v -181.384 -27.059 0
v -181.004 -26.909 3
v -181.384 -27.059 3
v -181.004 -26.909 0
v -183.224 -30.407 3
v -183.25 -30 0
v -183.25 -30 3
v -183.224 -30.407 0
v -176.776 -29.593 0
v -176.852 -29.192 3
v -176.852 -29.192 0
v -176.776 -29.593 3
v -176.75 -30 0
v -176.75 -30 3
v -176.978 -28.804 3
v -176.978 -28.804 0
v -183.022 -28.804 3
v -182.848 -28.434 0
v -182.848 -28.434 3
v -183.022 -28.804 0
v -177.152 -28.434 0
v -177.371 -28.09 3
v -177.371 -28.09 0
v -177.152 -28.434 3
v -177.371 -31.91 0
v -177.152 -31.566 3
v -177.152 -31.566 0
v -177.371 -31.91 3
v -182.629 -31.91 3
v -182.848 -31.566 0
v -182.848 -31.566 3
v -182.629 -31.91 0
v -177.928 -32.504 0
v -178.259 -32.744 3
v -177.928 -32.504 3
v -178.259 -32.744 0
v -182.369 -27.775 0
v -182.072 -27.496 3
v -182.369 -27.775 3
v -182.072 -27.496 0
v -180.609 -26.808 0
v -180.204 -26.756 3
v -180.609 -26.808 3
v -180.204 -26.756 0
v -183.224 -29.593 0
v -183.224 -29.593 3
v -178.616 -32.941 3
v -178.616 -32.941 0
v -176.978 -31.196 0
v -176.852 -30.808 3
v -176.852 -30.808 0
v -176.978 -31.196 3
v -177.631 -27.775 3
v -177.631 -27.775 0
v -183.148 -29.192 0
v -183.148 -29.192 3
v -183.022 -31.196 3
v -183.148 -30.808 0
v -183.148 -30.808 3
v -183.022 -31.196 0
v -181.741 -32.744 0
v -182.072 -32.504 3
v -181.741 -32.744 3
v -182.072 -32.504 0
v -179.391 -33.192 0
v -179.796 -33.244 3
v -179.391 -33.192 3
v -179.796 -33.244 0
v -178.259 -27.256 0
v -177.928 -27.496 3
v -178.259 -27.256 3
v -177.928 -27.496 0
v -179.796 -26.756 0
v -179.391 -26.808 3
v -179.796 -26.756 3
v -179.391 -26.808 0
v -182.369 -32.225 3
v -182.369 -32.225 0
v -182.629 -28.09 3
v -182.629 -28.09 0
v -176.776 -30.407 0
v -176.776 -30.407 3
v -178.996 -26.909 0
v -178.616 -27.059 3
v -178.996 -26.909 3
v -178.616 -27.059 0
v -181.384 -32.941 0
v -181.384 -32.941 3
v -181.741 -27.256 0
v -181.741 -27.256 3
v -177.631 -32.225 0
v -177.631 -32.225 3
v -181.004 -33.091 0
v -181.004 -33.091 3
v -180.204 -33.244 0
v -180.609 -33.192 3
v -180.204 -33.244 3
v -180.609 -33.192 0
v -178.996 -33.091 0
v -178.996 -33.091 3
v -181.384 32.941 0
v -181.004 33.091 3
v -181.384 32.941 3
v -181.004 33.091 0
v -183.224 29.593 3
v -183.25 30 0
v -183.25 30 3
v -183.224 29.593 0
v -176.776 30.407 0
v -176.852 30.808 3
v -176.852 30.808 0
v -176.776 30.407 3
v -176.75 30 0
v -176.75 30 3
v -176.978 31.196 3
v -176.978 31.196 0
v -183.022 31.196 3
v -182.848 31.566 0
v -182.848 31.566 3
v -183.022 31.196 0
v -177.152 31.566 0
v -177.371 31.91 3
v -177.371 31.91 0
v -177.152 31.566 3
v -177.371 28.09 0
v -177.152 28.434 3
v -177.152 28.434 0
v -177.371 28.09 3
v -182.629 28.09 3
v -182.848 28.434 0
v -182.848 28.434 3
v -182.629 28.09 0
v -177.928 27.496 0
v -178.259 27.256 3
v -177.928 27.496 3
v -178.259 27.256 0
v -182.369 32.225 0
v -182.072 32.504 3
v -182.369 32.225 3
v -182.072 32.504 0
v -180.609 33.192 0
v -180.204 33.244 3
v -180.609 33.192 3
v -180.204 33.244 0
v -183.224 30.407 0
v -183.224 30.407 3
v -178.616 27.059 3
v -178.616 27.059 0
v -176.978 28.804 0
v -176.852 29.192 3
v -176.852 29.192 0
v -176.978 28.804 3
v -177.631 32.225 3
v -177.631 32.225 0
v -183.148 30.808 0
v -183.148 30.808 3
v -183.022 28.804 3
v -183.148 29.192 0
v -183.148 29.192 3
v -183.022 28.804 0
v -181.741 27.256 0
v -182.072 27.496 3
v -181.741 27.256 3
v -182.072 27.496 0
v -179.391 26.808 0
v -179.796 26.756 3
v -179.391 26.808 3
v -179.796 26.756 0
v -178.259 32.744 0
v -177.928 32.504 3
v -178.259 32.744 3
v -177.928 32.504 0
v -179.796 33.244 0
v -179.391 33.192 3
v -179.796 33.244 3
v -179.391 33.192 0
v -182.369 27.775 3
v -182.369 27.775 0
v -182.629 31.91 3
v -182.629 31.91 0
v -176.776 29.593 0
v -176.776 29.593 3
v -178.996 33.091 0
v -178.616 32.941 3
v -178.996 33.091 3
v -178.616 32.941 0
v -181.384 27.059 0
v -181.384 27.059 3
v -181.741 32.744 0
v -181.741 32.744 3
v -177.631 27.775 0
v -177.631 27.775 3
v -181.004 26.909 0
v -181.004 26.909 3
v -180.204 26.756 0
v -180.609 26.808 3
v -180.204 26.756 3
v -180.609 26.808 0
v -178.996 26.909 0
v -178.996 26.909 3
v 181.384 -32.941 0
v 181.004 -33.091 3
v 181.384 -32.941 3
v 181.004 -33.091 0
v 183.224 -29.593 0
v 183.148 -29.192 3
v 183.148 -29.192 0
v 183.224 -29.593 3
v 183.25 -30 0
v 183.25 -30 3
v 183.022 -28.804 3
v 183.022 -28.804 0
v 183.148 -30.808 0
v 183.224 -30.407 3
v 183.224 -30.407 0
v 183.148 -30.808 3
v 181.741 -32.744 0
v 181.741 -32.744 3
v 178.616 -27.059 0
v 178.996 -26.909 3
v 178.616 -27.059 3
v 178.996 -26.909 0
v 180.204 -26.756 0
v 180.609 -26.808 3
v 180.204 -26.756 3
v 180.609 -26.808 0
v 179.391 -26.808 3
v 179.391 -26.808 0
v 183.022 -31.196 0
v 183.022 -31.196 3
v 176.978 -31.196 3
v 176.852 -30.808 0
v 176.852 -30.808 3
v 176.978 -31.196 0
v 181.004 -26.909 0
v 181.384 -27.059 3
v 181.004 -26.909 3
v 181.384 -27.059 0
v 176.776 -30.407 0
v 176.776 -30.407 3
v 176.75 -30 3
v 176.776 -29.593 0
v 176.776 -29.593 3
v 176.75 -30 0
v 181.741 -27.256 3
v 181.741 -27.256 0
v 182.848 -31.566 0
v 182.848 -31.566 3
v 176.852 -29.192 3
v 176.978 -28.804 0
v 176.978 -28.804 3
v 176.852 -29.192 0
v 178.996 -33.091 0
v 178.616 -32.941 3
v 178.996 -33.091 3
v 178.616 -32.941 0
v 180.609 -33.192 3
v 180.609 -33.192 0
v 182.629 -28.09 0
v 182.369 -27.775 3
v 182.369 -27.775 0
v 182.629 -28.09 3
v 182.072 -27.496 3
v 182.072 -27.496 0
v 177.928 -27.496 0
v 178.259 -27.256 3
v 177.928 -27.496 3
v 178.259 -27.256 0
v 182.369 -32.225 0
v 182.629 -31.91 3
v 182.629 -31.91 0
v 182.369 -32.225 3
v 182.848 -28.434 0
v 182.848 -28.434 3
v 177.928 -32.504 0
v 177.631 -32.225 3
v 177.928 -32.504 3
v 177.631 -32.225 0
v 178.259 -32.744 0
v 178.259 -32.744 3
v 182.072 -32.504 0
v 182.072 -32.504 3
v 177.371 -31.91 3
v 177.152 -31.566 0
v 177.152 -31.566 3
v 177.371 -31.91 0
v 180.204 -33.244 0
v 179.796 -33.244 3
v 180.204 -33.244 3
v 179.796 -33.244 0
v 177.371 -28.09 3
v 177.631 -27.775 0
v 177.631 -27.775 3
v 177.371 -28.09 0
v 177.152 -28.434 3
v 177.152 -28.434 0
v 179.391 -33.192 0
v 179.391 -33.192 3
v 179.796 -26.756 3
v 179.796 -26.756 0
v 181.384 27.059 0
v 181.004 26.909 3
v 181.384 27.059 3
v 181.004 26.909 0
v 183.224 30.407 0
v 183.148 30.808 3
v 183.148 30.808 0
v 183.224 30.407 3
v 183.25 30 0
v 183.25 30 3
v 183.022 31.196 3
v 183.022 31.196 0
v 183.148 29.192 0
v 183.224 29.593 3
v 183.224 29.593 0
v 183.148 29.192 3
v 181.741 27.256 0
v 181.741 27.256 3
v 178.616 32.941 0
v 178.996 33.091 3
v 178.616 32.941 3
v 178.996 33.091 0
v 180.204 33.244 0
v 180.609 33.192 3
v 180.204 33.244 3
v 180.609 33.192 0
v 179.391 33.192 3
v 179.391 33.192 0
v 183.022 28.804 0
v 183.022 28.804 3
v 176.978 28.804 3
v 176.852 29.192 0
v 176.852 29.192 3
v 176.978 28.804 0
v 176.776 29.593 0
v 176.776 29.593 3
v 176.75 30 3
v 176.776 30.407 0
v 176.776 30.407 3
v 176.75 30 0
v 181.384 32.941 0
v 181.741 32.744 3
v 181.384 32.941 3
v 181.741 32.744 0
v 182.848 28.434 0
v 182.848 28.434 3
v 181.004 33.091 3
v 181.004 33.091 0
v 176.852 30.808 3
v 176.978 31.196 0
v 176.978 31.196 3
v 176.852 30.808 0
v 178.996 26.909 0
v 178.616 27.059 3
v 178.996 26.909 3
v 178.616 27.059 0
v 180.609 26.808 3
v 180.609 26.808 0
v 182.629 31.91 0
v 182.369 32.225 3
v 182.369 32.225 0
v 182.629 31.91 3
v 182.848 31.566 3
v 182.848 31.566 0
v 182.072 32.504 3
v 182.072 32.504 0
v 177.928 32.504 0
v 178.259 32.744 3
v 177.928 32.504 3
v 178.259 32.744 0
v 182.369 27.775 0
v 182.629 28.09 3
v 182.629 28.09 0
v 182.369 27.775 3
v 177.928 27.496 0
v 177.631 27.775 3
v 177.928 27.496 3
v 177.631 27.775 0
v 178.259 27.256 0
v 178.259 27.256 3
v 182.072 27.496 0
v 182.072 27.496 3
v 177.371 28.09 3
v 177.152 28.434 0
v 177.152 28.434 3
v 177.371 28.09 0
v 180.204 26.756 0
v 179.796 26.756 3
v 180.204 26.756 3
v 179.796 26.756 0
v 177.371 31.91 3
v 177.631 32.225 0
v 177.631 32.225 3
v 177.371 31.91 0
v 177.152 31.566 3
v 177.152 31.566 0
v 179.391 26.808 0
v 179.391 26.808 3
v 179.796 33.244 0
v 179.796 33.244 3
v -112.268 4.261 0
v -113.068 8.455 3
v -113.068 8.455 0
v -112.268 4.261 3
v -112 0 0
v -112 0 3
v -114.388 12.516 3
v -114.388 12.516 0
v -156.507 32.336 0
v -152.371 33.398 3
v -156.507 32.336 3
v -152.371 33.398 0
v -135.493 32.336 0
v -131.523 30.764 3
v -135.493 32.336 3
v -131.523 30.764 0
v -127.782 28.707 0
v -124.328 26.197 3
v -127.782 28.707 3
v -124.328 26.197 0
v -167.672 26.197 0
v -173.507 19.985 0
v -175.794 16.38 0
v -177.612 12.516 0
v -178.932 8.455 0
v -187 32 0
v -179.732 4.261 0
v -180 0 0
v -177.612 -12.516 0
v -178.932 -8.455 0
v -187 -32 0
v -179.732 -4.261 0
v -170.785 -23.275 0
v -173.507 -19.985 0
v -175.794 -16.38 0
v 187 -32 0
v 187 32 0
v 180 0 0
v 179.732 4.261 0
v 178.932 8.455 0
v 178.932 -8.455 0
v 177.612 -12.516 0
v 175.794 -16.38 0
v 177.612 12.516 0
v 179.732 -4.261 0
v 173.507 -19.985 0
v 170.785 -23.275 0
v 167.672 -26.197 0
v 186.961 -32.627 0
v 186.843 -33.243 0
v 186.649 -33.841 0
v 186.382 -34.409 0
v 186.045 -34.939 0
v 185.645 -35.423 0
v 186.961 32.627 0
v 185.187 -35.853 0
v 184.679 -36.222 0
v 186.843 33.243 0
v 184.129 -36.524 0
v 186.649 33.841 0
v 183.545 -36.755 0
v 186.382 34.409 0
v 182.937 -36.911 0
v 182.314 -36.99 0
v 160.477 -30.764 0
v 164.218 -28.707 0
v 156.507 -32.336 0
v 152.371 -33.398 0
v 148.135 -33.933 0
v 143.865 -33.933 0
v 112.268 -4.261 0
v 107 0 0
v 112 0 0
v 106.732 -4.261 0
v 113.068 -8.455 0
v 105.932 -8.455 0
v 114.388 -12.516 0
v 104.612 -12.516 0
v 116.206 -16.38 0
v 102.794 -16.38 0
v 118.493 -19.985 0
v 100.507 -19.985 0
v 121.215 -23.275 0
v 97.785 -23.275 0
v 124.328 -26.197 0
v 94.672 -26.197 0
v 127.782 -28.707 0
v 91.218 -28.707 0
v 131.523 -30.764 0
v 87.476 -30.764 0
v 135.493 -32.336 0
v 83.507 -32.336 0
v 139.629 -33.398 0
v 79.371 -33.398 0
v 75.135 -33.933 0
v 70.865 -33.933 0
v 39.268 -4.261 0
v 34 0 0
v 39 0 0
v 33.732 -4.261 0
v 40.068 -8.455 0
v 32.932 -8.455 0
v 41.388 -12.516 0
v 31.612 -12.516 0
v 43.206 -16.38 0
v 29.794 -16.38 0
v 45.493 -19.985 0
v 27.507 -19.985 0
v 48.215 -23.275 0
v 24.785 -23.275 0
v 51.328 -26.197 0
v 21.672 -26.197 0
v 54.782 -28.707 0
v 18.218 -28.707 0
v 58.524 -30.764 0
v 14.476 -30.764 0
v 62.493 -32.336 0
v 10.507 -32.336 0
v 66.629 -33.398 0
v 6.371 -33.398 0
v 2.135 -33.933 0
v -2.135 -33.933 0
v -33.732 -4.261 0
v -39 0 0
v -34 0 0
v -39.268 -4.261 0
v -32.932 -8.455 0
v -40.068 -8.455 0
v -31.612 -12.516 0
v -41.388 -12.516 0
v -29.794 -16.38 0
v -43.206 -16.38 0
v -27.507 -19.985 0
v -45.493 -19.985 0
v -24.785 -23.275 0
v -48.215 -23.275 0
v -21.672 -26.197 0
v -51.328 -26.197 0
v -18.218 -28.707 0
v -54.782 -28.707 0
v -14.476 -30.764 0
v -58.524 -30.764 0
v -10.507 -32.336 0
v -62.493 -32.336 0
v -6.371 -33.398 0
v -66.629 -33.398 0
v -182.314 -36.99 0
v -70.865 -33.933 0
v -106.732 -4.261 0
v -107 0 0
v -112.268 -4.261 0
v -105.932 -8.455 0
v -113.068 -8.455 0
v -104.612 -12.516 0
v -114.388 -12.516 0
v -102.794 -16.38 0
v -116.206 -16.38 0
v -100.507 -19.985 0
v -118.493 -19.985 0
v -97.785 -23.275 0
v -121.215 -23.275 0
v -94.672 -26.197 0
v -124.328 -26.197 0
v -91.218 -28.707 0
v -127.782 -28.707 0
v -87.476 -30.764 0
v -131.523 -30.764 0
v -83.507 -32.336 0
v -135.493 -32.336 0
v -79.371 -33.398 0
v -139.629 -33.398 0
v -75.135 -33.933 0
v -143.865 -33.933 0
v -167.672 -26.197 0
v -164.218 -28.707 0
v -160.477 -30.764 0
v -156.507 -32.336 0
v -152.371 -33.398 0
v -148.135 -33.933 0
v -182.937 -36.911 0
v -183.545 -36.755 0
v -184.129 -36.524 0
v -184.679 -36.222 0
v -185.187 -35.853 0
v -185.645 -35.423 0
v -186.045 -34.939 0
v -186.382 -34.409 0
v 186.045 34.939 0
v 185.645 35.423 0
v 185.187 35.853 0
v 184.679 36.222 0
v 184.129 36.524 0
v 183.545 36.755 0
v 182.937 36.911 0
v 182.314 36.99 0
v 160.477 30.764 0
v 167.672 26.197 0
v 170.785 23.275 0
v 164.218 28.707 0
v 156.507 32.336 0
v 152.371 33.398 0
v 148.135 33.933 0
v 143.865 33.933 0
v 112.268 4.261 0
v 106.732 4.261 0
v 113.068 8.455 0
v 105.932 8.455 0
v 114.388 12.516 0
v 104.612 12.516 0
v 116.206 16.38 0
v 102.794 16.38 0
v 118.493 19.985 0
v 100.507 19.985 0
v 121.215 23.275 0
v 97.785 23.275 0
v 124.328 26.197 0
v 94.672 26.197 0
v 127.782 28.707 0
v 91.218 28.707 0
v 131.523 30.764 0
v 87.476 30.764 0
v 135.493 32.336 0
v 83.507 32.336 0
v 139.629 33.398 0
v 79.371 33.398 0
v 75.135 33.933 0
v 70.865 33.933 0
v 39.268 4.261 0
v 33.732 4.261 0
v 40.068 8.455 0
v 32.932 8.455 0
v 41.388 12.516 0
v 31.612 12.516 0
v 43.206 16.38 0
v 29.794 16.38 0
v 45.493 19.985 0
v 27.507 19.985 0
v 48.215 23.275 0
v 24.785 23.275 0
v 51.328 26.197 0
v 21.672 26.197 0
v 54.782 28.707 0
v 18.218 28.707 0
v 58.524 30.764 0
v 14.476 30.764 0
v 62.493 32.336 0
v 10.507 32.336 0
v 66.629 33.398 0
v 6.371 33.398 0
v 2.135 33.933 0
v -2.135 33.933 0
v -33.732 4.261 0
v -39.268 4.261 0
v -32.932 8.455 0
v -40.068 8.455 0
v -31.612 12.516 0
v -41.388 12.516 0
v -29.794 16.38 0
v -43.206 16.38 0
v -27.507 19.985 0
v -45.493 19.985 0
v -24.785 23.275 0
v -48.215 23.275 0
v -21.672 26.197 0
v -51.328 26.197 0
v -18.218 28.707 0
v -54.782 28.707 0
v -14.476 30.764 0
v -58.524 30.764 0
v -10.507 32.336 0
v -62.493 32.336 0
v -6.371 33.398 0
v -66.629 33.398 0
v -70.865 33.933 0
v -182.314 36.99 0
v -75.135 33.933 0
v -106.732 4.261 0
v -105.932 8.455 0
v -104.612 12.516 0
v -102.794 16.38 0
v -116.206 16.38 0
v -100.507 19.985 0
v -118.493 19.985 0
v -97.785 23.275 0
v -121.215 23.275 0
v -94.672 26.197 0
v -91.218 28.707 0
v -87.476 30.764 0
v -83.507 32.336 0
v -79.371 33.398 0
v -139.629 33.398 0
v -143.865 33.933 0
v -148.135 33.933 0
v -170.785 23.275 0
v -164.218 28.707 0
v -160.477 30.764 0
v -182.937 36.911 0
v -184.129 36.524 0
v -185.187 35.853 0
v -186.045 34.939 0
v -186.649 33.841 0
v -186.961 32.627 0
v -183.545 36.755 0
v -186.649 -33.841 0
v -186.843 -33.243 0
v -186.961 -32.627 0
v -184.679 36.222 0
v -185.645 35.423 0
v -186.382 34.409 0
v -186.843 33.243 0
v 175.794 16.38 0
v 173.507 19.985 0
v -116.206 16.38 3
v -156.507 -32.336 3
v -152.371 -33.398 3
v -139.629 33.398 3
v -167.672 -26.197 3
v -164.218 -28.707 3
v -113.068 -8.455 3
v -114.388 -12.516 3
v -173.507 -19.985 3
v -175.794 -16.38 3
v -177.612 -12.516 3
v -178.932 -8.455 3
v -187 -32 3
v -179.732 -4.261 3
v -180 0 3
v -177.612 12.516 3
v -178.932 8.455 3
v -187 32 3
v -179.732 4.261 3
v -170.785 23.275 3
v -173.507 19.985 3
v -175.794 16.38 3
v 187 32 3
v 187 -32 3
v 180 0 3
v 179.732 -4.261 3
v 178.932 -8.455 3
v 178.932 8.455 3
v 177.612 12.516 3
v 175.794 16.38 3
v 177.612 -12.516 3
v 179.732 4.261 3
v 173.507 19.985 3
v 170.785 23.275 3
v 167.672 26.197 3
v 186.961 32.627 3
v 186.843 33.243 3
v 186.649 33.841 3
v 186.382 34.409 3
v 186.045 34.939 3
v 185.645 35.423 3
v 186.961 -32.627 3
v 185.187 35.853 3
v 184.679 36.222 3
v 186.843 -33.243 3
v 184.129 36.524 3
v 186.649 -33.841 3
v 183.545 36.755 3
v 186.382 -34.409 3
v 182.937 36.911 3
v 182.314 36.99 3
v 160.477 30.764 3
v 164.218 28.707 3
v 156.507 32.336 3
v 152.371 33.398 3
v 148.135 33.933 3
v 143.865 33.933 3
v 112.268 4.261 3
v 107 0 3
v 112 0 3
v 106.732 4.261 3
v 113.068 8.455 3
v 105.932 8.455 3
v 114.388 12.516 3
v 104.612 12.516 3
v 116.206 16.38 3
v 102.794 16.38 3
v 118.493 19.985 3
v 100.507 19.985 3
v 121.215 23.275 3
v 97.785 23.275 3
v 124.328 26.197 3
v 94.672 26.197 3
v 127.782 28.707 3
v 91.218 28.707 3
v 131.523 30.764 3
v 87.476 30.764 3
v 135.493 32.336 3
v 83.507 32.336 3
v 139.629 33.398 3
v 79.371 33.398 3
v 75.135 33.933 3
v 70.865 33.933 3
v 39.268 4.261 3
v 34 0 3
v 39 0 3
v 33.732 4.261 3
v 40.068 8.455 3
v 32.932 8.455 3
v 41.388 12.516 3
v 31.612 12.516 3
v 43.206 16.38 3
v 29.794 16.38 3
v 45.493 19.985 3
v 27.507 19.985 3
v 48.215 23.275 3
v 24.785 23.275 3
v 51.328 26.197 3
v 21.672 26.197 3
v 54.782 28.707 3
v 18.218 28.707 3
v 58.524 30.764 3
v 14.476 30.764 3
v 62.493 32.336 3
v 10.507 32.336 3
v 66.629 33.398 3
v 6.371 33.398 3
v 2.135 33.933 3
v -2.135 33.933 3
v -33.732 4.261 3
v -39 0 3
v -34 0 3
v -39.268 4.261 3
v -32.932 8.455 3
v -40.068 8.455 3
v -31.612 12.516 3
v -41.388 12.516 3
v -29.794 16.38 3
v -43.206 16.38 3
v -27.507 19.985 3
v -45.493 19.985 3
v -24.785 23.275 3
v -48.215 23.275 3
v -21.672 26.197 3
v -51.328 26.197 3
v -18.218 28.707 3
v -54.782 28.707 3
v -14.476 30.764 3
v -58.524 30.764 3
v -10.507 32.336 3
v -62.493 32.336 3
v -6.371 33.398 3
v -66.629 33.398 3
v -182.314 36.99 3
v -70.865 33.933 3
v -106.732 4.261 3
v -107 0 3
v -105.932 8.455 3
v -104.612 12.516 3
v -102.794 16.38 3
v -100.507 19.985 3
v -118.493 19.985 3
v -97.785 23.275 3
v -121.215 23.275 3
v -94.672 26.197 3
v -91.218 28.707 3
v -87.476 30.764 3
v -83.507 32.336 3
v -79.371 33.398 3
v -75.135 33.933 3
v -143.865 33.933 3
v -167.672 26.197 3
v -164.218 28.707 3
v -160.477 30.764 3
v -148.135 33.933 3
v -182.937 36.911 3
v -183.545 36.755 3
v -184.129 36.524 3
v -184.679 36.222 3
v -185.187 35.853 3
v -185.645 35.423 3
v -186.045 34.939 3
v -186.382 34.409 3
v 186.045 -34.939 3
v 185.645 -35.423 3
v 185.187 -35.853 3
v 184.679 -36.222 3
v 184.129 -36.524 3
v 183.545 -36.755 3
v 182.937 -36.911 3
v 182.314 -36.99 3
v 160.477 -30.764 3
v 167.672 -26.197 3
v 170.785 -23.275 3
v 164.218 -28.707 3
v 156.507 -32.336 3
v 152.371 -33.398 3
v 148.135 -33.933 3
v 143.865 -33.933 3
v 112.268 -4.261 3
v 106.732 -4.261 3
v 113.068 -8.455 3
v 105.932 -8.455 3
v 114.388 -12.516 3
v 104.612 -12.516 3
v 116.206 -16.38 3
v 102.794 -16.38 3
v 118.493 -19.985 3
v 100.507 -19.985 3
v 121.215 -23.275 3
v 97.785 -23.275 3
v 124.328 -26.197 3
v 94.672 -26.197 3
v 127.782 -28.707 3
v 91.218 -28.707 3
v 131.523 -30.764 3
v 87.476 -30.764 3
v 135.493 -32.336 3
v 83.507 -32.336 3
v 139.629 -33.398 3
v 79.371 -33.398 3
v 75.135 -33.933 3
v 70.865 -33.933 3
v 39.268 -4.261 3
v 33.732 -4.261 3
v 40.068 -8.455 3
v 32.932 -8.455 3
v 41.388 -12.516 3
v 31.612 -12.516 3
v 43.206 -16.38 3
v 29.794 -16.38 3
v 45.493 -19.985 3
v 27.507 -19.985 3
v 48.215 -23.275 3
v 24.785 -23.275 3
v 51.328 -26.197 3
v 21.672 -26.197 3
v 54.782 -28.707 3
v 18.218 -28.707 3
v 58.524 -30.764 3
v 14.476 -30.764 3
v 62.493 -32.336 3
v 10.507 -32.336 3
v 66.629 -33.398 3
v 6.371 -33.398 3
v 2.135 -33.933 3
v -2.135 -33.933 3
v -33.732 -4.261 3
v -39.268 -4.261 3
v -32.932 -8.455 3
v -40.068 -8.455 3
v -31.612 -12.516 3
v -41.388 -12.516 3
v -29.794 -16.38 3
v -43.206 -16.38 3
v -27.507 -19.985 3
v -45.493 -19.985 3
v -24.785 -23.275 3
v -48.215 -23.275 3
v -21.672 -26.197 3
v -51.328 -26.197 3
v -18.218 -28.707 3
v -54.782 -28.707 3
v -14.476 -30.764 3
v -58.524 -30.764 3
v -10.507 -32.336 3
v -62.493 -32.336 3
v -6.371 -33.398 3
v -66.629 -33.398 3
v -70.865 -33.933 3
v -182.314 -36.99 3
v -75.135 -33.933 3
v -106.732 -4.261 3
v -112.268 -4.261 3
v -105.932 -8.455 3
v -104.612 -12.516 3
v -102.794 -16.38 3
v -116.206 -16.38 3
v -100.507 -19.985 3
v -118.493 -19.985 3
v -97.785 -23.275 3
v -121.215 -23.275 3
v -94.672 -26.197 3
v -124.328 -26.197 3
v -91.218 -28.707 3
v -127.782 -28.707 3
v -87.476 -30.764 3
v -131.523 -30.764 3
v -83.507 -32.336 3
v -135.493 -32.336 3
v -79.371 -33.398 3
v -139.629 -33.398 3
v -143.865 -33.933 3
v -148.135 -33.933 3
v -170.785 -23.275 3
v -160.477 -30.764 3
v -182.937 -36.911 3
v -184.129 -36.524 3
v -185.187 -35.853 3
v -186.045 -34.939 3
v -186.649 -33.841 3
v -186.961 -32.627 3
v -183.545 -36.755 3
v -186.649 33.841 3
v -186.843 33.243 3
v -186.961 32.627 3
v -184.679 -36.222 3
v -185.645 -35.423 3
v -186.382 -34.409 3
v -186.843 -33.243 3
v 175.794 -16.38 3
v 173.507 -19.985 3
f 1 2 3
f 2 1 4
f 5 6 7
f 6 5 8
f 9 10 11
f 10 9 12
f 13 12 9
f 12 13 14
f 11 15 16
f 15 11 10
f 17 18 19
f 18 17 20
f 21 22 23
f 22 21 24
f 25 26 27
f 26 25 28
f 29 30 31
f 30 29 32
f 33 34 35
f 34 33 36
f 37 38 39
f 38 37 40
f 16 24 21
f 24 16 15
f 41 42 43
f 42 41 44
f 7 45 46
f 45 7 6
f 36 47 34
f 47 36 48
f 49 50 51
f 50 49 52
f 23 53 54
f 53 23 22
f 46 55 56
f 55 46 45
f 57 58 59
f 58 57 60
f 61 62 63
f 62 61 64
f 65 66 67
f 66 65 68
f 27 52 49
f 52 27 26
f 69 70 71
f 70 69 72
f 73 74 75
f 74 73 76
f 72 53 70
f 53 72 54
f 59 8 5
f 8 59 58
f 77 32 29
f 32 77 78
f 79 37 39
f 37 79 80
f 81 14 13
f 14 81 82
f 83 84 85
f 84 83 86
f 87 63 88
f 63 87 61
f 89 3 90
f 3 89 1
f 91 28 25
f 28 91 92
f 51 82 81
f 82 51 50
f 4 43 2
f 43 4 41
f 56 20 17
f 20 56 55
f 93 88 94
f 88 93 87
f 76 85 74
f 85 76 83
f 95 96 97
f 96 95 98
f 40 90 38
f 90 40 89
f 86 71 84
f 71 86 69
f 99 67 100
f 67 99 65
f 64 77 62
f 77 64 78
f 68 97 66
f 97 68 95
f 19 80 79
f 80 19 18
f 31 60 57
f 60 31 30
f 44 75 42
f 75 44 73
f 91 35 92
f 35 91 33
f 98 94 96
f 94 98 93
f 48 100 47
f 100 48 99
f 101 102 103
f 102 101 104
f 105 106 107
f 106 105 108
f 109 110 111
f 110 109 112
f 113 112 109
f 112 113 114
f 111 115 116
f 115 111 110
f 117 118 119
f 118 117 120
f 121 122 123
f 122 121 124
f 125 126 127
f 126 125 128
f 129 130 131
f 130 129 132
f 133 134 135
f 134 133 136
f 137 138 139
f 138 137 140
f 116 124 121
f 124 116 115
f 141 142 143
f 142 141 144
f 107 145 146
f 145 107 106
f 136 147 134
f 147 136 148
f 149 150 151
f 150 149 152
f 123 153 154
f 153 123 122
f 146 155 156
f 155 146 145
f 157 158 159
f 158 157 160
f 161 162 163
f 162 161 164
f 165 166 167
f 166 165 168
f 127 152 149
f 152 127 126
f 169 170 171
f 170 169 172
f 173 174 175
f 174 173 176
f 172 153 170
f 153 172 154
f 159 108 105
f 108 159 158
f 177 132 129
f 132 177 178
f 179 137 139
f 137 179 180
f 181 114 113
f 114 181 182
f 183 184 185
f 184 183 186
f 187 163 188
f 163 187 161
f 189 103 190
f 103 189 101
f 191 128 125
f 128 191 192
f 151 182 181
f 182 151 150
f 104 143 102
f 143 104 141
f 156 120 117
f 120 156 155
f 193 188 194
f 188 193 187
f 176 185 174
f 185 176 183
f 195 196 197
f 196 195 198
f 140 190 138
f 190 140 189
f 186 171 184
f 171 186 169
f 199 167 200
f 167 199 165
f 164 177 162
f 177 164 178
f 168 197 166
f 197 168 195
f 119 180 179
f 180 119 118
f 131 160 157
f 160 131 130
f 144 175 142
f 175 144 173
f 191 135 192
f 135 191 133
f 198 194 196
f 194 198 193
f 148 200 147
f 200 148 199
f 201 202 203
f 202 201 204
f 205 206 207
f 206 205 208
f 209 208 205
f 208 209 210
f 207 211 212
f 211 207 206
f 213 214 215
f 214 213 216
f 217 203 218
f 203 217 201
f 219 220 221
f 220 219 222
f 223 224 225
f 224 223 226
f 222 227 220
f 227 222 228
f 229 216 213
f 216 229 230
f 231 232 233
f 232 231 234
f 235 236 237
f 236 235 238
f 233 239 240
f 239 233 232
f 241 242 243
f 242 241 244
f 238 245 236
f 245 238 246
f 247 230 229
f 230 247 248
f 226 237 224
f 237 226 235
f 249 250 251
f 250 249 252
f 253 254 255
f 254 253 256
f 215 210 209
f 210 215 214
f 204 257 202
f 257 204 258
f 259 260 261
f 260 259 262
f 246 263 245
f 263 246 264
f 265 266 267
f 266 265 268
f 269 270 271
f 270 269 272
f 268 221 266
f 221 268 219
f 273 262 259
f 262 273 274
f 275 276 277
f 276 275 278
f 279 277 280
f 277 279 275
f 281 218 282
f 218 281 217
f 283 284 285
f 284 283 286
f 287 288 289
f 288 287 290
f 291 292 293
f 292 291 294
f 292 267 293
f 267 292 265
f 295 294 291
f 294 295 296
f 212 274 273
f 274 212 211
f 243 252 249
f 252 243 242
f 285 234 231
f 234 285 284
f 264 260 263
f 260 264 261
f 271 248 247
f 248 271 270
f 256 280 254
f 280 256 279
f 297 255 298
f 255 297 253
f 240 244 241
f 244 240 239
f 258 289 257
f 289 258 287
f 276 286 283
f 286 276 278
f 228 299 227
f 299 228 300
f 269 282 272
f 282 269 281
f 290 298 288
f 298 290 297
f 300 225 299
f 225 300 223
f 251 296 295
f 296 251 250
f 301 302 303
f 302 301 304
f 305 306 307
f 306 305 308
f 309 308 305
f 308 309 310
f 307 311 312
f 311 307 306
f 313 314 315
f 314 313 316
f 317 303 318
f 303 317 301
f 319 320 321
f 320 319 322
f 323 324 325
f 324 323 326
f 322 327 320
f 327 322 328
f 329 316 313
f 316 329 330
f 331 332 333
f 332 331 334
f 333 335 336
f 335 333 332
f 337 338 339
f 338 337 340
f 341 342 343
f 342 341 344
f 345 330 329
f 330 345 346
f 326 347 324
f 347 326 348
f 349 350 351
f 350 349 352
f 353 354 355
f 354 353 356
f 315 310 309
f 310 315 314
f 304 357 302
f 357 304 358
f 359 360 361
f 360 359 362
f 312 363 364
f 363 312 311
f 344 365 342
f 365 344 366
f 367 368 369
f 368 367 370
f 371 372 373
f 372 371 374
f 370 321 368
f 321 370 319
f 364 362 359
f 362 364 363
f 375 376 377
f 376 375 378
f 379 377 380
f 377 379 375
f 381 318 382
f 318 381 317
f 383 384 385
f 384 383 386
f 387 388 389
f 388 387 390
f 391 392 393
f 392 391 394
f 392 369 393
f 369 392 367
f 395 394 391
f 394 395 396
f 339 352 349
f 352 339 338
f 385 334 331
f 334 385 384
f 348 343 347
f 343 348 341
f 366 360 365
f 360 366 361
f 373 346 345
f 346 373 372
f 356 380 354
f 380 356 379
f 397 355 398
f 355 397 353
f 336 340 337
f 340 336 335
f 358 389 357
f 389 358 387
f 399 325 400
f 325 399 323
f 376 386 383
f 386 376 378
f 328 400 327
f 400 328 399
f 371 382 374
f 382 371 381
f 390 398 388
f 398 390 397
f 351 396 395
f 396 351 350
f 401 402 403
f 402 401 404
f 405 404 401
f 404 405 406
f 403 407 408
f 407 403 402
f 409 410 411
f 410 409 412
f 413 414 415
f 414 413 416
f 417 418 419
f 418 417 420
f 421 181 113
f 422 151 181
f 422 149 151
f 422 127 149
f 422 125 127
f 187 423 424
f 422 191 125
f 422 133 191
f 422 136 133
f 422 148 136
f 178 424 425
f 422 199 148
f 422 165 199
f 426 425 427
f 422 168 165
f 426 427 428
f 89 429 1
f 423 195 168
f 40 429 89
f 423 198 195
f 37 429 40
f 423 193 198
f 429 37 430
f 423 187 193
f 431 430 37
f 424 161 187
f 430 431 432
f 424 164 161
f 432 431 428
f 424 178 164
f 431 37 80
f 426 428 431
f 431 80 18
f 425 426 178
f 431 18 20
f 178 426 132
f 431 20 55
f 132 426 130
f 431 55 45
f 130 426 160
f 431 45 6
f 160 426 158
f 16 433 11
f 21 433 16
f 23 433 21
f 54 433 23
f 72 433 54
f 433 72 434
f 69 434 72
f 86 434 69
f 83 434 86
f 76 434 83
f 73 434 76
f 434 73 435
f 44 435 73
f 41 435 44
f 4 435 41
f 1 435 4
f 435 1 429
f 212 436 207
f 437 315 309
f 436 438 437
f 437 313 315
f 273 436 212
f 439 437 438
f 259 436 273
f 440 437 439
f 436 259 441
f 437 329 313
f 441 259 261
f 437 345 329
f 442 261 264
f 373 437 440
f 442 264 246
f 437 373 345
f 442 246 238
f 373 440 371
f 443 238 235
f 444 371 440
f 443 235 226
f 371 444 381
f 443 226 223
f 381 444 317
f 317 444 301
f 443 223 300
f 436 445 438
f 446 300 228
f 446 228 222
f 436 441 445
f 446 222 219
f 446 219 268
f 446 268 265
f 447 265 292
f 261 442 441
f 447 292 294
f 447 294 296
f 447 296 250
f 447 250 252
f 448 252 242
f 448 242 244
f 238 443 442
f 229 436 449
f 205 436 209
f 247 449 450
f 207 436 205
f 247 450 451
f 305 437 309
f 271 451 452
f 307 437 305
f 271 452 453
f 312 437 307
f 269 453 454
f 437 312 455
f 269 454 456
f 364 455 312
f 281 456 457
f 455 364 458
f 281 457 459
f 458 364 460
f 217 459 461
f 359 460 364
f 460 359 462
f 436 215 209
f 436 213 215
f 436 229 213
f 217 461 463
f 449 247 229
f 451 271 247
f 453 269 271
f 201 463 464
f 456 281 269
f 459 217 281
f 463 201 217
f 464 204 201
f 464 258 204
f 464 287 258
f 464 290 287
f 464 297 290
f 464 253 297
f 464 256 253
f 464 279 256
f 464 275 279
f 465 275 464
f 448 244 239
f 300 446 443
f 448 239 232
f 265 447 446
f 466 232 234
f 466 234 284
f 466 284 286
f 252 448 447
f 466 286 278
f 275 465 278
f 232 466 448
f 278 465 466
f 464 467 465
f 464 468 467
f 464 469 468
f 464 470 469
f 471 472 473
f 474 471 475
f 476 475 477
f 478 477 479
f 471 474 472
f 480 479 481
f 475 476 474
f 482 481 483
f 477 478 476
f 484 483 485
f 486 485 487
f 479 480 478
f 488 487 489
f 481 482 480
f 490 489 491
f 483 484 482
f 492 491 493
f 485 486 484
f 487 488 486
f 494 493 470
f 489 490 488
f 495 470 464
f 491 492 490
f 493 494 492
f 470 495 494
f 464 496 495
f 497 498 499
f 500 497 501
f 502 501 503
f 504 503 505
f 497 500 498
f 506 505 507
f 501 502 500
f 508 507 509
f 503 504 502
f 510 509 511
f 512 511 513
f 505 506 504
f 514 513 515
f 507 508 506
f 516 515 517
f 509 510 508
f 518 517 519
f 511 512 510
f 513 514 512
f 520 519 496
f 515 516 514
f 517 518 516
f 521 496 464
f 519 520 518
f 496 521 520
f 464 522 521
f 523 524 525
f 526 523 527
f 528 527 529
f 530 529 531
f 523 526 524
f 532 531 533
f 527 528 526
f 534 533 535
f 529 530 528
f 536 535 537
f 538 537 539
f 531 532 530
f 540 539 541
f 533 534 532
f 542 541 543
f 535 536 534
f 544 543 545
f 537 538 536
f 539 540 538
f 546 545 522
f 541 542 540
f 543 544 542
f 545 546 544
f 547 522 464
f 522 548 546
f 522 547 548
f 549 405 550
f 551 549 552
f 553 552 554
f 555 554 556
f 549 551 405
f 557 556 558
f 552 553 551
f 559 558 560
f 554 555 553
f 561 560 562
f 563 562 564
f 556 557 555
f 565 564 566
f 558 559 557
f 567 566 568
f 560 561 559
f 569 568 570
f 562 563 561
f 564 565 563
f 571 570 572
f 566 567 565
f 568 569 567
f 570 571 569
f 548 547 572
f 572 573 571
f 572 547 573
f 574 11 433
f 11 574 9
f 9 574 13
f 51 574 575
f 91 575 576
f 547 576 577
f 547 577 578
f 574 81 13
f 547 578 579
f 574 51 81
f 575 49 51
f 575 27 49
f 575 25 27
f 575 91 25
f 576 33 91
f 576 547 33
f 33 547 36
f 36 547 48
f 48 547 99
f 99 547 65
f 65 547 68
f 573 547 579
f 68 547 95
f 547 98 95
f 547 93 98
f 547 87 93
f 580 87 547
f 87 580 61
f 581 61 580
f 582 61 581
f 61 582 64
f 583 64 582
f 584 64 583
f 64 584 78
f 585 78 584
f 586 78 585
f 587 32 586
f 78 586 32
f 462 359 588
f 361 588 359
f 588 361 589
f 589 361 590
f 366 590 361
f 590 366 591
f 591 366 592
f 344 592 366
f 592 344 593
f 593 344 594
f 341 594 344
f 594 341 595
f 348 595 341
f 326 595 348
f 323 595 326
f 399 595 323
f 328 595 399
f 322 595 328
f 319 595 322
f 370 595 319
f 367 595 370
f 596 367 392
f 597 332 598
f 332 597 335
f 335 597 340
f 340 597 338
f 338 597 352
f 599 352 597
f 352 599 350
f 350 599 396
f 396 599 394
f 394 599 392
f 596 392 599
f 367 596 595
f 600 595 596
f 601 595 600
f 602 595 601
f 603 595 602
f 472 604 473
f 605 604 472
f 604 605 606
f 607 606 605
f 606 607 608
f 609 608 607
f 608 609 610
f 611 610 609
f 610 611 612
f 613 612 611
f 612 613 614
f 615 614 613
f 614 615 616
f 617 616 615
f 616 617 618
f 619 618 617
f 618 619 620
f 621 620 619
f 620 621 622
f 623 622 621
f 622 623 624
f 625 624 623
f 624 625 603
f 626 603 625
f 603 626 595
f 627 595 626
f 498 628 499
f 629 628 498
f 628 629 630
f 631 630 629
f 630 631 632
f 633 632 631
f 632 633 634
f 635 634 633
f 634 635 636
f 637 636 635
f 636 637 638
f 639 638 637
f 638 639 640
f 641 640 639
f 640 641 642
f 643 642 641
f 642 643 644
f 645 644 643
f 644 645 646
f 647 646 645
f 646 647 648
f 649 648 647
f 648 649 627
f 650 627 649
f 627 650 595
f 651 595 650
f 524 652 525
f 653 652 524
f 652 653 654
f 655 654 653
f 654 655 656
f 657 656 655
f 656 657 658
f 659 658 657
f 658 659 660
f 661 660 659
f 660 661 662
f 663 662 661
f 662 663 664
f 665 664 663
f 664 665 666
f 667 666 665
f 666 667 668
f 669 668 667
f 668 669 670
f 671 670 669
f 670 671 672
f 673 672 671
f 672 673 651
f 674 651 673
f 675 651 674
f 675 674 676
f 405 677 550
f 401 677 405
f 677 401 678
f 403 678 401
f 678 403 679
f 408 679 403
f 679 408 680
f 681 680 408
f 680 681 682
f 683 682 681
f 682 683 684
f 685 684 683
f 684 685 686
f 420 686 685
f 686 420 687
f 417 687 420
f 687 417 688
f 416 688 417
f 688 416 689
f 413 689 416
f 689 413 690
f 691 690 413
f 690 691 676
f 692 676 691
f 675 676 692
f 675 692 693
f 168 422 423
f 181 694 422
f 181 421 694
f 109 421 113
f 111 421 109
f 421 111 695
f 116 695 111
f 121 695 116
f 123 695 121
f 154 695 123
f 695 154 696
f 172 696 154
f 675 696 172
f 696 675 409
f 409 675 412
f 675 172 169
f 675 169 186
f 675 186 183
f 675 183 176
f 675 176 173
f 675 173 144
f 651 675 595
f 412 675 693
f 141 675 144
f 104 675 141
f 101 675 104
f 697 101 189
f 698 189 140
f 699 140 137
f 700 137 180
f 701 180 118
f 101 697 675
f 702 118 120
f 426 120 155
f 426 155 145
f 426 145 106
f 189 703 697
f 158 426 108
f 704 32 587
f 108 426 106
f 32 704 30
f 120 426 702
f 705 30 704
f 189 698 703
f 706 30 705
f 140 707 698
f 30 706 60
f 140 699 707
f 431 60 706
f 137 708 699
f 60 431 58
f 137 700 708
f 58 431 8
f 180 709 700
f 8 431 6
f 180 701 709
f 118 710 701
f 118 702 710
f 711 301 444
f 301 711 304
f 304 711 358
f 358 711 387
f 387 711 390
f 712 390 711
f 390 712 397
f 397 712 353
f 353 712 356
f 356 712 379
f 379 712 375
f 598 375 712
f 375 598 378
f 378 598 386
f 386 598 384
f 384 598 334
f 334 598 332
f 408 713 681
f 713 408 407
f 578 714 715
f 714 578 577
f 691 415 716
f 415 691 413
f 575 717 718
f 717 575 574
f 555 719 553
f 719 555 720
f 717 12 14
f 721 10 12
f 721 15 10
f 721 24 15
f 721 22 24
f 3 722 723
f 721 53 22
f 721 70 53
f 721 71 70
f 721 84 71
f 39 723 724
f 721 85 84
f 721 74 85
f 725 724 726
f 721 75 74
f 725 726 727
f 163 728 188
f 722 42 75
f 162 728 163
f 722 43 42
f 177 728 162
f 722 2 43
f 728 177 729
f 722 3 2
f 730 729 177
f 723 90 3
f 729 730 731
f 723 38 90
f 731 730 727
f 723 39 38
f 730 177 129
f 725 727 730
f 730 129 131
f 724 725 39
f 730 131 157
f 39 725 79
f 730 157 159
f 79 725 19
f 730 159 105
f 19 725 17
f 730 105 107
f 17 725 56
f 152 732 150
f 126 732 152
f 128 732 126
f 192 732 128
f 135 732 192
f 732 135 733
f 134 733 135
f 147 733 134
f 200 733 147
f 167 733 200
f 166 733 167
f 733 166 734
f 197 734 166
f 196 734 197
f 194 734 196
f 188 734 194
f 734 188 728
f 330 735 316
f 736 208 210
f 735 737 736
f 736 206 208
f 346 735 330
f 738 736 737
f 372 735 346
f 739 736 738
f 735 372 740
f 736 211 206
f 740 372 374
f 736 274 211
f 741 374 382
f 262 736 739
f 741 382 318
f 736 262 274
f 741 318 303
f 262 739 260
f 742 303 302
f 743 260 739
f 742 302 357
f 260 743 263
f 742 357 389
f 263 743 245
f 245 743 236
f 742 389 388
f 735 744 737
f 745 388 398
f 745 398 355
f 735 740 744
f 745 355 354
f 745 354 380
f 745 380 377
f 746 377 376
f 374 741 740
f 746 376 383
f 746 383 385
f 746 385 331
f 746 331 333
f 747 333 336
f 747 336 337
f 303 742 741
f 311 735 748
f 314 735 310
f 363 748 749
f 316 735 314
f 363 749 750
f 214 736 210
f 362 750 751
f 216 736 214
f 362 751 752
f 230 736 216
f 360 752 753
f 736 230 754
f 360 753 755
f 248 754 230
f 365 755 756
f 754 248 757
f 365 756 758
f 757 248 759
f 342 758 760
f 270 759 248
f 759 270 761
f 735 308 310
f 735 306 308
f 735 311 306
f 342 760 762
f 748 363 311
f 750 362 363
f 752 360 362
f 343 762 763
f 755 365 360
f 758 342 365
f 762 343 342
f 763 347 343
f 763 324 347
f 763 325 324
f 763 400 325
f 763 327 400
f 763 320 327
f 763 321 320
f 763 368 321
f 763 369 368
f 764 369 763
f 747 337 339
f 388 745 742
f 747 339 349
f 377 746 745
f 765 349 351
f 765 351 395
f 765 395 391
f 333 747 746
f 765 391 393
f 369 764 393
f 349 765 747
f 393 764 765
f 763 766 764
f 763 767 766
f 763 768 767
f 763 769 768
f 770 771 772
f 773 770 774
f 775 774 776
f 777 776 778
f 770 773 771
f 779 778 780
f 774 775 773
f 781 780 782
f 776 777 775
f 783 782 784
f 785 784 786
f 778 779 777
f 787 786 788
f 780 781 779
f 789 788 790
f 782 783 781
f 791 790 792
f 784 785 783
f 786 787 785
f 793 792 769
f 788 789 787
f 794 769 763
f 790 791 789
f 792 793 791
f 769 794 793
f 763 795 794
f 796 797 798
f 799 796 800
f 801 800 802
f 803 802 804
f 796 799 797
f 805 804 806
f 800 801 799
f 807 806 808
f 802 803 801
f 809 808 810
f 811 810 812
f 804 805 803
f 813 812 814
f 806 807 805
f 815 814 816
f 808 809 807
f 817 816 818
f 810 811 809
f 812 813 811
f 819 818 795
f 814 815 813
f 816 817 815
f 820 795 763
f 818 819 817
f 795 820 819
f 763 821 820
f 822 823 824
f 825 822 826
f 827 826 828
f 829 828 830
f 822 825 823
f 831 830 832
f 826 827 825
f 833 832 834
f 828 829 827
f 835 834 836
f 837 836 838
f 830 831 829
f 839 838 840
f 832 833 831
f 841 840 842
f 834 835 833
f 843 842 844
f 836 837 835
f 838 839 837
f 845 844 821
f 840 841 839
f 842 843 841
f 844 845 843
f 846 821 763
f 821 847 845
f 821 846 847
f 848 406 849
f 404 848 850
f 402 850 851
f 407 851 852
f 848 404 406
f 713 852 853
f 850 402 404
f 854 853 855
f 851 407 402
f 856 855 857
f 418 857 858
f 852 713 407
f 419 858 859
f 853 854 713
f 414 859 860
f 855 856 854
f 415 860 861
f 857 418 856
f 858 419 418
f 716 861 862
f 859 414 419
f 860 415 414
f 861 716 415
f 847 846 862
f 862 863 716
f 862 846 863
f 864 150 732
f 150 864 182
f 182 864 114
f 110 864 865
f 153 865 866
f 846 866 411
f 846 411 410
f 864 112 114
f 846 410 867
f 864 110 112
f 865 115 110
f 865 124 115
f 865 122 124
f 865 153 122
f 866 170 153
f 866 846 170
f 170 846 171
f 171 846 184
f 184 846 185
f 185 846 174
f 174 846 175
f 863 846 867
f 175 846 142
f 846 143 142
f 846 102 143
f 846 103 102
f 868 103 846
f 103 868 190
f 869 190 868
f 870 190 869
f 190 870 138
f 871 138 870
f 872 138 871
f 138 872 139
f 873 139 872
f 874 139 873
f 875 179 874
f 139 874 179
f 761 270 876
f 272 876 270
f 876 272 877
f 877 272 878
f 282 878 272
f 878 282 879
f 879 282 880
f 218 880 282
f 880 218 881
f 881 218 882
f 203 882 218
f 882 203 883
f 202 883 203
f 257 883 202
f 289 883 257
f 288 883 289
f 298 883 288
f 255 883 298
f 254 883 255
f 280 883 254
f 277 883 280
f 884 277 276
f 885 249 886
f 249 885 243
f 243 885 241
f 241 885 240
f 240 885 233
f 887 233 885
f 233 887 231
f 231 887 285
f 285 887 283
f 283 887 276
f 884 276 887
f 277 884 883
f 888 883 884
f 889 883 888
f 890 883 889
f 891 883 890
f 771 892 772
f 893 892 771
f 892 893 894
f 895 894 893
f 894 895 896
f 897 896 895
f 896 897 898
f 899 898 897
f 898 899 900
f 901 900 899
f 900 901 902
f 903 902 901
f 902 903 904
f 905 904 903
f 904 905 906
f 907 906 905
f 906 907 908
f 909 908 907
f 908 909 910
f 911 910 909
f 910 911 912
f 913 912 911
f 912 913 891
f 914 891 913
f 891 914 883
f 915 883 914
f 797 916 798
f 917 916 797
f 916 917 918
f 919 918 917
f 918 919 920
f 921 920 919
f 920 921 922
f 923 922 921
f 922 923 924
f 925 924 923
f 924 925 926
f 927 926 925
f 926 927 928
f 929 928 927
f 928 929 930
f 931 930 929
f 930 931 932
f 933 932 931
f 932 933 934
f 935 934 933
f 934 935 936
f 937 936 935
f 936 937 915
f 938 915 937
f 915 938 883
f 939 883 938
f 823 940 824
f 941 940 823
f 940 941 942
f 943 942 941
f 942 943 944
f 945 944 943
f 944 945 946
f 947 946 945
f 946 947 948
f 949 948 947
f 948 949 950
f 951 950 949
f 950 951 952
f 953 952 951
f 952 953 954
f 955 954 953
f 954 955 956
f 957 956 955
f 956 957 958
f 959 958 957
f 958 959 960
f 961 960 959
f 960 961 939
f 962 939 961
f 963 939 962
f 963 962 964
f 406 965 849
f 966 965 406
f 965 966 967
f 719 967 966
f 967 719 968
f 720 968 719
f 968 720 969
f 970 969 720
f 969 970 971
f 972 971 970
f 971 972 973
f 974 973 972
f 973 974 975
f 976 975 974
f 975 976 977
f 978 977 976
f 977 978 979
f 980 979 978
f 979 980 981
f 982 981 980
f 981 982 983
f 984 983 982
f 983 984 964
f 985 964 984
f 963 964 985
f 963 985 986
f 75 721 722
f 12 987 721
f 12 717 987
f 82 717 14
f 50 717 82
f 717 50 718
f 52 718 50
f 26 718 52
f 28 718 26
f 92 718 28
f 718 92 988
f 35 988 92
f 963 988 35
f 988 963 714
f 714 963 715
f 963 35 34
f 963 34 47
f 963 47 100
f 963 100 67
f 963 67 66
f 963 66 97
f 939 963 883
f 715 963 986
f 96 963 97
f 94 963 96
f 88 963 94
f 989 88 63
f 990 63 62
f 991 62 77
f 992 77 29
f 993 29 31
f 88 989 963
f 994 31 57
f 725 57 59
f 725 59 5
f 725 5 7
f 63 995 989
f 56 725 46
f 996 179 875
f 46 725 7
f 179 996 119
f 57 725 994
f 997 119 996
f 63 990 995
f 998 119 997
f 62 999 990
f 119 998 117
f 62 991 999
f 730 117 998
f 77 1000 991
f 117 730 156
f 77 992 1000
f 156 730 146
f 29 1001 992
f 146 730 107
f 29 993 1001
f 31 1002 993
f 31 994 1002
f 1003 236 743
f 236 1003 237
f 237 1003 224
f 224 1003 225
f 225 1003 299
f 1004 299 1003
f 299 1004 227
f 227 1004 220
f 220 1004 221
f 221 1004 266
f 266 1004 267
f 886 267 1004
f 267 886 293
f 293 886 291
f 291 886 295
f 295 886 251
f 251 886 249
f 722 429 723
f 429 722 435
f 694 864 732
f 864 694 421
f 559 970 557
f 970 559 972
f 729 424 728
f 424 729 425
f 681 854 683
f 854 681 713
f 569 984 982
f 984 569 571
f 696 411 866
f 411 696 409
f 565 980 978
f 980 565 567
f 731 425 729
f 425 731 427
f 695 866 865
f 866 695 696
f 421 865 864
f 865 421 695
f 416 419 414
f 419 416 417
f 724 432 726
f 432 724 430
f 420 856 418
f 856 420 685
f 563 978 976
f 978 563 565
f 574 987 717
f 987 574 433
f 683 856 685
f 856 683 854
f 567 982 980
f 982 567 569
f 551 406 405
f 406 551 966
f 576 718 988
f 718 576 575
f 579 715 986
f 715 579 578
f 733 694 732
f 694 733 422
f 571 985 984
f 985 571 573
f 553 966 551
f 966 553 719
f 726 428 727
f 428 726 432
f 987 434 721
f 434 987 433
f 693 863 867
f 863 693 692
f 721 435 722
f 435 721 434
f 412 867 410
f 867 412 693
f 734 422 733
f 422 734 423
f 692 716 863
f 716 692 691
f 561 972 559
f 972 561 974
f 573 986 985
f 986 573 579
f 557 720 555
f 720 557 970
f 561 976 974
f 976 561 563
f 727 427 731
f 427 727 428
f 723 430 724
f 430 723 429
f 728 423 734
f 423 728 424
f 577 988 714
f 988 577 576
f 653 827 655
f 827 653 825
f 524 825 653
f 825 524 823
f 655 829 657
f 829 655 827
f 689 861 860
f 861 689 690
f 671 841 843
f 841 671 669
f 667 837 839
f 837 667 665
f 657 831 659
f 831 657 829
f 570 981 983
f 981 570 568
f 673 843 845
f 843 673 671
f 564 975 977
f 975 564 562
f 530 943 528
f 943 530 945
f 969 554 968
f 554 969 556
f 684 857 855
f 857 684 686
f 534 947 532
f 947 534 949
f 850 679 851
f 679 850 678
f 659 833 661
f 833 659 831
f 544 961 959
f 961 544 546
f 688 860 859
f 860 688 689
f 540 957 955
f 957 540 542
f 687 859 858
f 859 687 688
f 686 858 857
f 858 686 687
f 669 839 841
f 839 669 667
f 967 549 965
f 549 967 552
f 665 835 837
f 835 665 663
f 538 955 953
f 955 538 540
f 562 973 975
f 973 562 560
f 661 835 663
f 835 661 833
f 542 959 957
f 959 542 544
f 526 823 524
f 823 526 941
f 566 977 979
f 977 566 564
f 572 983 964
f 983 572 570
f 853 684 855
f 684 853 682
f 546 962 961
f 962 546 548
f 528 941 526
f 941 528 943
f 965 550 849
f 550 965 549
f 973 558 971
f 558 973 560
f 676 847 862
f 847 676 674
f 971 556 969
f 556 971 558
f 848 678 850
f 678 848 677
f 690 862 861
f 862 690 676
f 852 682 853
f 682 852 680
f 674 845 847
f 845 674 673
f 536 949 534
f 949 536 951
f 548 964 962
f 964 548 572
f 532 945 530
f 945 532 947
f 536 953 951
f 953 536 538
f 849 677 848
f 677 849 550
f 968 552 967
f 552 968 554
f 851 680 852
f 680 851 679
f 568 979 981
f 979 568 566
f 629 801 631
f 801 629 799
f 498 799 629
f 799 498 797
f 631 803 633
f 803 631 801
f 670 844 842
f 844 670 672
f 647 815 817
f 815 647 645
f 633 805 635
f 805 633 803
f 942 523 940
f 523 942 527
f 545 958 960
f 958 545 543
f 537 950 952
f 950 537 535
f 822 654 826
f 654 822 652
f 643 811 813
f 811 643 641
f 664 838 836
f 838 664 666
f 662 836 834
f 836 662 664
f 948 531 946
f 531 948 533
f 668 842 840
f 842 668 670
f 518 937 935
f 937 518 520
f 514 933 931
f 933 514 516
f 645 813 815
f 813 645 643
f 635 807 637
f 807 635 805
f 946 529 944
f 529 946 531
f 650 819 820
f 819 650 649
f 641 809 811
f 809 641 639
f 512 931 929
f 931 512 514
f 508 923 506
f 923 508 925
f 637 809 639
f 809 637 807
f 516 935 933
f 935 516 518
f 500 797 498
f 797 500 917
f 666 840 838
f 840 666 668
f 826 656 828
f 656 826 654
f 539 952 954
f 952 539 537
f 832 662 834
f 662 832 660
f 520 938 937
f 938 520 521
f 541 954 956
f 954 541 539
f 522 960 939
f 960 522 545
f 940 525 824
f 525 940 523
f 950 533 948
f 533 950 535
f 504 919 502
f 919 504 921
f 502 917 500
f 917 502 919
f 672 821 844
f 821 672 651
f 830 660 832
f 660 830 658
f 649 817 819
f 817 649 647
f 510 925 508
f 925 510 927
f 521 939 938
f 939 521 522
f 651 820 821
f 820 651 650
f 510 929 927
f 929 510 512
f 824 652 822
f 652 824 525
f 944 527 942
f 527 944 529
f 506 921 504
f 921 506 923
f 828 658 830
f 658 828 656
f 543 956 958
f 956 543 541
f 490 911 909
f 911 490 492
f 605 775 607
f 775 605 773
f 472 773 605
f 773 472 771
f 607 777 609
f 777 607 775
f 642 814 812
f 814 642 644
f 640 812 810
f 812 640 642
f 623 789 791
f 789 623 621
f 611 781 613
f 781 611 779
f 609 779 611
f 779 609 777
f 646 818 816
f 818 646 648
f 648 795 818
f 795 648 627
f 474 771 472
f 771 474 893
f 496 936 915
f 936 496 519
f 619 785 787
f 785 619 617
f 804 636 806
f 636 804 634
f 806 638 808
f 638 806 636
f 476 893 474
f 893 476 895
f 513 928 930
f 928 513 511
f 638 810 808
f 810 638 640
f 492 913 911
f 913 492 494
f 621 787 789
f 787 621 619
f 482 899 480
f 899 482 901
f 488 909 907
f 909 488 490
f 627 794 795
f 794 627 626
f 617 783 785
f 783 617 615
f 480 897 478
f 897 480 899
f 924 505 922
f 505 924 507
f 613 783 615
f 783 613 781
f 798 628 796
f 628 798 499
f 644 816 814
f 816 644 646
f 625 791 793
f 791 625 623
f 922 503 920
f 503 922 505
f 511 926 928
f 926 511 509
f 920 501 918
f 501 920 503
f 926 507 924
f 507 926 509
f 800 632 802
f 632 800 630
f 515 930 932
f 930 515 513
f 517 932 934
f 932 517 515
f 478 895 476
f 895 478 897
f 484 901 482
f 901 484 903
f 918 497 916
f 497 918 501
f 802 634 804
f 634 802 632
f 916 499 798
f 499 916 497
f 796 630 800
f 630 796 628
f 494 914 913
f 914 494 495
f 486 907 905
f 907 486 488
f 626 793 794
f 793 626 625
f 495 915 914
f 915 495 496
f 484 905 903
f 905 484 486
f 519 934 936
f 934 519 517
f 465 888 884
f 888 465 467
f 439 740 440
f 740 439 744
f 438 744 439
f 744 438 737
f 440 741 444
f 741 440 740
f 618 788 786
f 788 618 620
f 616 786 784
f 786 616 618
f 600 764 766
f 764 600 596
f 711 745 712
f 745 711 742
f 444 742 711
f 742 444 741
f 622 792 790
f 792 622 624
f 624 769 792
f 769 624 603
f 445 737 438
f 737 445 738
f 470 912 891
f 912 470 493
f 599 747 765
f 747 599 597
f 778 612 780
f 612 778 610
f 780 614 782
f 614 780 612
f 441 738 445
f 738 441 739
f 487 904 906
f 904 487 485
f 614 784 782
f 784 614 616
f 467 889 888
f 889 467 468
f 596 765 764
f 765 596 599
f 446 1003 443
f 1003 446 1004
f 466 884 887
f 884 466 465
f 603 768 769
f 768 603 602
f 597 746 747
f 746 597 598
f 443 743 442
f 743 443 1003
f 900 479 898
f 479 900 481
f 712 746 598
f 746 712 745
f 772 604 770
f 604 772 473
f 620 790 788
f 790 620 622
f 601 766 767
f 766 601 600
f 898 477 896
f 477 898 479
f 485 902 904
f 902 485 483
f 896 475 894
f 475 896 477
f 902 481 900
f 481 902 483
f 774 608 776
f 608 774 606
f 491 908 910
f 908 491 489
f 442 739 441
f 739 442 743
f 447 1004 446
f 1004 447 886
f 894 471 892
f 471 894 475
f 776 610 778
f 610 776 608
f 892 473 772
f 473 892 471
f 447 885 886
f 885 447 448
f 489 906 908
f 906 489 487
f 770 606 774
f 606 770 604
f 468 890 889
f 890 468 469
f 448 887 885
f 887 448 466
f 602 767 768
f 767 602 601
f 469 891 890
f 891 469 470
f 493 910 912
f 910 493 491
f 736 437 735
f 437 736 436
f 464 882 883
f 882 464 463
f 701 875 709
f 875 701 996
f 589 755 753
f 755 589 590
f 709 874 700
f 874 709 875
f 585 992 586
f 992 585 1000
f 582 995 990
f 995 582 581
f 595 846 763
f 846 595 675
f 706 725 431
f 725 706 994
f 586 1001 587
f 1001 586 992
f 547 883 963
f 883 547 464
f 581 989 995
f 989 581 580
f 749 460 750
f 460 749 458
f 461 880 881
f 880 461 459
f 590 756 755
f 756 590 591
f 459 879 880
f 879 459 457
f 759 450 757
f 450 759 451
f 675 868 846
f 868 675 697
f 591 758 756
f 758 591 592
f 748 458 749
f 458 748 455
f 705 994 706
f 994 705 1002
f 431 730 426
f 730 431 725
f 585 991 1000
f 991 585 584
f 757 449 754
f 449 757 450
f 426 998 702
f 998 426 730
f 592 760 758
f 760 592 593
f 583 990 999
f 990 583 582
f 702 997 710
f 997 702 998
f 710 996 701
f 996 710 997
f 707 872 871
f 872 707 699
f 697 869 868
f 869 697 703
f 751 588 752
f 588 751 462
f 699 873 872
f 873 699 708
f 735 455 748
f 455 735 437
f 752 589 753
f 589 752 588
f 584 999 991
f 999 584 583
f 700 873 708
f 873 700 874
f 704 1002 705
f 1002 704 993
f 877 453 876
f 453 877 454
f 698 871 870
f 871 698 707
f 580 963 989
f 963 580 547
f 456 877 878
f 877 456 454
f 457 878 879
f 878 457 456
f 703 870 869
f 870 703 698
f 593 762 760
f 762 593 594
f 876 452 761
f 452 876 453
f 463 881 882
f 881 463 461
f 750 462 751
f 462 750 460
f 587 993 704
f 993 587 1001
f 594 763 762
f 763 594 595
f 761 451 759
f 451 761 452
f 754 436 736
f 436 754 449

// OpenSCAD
$fn = 50;

difference() {
	union() {
		hull() {
			translate(v = [-182.0, 32.0, 0]) {
				cylinder(h = 3, r = 5);
			}
			translate(v = [182.0, 32.0, 0]) {
				cylinder(h = 3, r = 5);
			}
			translate(v = [-182.0, -32.0, 0]) {
				cylinder(h = 3, r = 5);
			}
			translate(v = [182.0, -32.0, 0]) {
				cylinder(h = 3, r = 5);
			}
		}
	}
	union() {
		translate(v = [-180.0, -30.0, -100.0]) {
			cylinder(h = 200, r = 3.25);
		}
		translate(v = [-180.0, 30.0, -100.0]) {
			cylinder(h = 200, r = 3.25);
		}
		translate(v = [180.0, -30.0, -100.0]) {
			cylinder(h = 200, r = 3.25);
		}
		translate(v = [180.0, 30.0, -100.0]) {
			cylinder(h = 200, r = 3.25);
		}
		translate(v = [-180.0, -30.0, -100.0]) {
			cylinder(h = 200, r = 1.8);
		}
		translate(v = [-180.0, 30.0, -100.0]) {
			cylinder(h = 200, r = 1.8);
		}
		translate(v = [180.0, -30.0, -100.0]) {
			cylinder(h = 200, r = 1.8);
		}
		translate(v = [180.0, 30.0, -100.0]) {
			cylinder(h = 200, r = 1.8);
		}
		translate(v = [-146.0, 0, 0.0]) {
			cylinder(h = 3, r = 34.0);
		}
		translate(v = [-73.0, 0, 0.0]) {
			cylinder(h = 3, r = 34.0);
		}
		cylinder(h = 3, r = 34.0);
		translate(v = [73.0, 0, 0.0]) {
			cylinder(h = 3, r = 34.0);
		}
		translate(v = [146.0, 0, 0.0]) {
			cylinder(h = 3, r = 34.0);
		}
	}
}
